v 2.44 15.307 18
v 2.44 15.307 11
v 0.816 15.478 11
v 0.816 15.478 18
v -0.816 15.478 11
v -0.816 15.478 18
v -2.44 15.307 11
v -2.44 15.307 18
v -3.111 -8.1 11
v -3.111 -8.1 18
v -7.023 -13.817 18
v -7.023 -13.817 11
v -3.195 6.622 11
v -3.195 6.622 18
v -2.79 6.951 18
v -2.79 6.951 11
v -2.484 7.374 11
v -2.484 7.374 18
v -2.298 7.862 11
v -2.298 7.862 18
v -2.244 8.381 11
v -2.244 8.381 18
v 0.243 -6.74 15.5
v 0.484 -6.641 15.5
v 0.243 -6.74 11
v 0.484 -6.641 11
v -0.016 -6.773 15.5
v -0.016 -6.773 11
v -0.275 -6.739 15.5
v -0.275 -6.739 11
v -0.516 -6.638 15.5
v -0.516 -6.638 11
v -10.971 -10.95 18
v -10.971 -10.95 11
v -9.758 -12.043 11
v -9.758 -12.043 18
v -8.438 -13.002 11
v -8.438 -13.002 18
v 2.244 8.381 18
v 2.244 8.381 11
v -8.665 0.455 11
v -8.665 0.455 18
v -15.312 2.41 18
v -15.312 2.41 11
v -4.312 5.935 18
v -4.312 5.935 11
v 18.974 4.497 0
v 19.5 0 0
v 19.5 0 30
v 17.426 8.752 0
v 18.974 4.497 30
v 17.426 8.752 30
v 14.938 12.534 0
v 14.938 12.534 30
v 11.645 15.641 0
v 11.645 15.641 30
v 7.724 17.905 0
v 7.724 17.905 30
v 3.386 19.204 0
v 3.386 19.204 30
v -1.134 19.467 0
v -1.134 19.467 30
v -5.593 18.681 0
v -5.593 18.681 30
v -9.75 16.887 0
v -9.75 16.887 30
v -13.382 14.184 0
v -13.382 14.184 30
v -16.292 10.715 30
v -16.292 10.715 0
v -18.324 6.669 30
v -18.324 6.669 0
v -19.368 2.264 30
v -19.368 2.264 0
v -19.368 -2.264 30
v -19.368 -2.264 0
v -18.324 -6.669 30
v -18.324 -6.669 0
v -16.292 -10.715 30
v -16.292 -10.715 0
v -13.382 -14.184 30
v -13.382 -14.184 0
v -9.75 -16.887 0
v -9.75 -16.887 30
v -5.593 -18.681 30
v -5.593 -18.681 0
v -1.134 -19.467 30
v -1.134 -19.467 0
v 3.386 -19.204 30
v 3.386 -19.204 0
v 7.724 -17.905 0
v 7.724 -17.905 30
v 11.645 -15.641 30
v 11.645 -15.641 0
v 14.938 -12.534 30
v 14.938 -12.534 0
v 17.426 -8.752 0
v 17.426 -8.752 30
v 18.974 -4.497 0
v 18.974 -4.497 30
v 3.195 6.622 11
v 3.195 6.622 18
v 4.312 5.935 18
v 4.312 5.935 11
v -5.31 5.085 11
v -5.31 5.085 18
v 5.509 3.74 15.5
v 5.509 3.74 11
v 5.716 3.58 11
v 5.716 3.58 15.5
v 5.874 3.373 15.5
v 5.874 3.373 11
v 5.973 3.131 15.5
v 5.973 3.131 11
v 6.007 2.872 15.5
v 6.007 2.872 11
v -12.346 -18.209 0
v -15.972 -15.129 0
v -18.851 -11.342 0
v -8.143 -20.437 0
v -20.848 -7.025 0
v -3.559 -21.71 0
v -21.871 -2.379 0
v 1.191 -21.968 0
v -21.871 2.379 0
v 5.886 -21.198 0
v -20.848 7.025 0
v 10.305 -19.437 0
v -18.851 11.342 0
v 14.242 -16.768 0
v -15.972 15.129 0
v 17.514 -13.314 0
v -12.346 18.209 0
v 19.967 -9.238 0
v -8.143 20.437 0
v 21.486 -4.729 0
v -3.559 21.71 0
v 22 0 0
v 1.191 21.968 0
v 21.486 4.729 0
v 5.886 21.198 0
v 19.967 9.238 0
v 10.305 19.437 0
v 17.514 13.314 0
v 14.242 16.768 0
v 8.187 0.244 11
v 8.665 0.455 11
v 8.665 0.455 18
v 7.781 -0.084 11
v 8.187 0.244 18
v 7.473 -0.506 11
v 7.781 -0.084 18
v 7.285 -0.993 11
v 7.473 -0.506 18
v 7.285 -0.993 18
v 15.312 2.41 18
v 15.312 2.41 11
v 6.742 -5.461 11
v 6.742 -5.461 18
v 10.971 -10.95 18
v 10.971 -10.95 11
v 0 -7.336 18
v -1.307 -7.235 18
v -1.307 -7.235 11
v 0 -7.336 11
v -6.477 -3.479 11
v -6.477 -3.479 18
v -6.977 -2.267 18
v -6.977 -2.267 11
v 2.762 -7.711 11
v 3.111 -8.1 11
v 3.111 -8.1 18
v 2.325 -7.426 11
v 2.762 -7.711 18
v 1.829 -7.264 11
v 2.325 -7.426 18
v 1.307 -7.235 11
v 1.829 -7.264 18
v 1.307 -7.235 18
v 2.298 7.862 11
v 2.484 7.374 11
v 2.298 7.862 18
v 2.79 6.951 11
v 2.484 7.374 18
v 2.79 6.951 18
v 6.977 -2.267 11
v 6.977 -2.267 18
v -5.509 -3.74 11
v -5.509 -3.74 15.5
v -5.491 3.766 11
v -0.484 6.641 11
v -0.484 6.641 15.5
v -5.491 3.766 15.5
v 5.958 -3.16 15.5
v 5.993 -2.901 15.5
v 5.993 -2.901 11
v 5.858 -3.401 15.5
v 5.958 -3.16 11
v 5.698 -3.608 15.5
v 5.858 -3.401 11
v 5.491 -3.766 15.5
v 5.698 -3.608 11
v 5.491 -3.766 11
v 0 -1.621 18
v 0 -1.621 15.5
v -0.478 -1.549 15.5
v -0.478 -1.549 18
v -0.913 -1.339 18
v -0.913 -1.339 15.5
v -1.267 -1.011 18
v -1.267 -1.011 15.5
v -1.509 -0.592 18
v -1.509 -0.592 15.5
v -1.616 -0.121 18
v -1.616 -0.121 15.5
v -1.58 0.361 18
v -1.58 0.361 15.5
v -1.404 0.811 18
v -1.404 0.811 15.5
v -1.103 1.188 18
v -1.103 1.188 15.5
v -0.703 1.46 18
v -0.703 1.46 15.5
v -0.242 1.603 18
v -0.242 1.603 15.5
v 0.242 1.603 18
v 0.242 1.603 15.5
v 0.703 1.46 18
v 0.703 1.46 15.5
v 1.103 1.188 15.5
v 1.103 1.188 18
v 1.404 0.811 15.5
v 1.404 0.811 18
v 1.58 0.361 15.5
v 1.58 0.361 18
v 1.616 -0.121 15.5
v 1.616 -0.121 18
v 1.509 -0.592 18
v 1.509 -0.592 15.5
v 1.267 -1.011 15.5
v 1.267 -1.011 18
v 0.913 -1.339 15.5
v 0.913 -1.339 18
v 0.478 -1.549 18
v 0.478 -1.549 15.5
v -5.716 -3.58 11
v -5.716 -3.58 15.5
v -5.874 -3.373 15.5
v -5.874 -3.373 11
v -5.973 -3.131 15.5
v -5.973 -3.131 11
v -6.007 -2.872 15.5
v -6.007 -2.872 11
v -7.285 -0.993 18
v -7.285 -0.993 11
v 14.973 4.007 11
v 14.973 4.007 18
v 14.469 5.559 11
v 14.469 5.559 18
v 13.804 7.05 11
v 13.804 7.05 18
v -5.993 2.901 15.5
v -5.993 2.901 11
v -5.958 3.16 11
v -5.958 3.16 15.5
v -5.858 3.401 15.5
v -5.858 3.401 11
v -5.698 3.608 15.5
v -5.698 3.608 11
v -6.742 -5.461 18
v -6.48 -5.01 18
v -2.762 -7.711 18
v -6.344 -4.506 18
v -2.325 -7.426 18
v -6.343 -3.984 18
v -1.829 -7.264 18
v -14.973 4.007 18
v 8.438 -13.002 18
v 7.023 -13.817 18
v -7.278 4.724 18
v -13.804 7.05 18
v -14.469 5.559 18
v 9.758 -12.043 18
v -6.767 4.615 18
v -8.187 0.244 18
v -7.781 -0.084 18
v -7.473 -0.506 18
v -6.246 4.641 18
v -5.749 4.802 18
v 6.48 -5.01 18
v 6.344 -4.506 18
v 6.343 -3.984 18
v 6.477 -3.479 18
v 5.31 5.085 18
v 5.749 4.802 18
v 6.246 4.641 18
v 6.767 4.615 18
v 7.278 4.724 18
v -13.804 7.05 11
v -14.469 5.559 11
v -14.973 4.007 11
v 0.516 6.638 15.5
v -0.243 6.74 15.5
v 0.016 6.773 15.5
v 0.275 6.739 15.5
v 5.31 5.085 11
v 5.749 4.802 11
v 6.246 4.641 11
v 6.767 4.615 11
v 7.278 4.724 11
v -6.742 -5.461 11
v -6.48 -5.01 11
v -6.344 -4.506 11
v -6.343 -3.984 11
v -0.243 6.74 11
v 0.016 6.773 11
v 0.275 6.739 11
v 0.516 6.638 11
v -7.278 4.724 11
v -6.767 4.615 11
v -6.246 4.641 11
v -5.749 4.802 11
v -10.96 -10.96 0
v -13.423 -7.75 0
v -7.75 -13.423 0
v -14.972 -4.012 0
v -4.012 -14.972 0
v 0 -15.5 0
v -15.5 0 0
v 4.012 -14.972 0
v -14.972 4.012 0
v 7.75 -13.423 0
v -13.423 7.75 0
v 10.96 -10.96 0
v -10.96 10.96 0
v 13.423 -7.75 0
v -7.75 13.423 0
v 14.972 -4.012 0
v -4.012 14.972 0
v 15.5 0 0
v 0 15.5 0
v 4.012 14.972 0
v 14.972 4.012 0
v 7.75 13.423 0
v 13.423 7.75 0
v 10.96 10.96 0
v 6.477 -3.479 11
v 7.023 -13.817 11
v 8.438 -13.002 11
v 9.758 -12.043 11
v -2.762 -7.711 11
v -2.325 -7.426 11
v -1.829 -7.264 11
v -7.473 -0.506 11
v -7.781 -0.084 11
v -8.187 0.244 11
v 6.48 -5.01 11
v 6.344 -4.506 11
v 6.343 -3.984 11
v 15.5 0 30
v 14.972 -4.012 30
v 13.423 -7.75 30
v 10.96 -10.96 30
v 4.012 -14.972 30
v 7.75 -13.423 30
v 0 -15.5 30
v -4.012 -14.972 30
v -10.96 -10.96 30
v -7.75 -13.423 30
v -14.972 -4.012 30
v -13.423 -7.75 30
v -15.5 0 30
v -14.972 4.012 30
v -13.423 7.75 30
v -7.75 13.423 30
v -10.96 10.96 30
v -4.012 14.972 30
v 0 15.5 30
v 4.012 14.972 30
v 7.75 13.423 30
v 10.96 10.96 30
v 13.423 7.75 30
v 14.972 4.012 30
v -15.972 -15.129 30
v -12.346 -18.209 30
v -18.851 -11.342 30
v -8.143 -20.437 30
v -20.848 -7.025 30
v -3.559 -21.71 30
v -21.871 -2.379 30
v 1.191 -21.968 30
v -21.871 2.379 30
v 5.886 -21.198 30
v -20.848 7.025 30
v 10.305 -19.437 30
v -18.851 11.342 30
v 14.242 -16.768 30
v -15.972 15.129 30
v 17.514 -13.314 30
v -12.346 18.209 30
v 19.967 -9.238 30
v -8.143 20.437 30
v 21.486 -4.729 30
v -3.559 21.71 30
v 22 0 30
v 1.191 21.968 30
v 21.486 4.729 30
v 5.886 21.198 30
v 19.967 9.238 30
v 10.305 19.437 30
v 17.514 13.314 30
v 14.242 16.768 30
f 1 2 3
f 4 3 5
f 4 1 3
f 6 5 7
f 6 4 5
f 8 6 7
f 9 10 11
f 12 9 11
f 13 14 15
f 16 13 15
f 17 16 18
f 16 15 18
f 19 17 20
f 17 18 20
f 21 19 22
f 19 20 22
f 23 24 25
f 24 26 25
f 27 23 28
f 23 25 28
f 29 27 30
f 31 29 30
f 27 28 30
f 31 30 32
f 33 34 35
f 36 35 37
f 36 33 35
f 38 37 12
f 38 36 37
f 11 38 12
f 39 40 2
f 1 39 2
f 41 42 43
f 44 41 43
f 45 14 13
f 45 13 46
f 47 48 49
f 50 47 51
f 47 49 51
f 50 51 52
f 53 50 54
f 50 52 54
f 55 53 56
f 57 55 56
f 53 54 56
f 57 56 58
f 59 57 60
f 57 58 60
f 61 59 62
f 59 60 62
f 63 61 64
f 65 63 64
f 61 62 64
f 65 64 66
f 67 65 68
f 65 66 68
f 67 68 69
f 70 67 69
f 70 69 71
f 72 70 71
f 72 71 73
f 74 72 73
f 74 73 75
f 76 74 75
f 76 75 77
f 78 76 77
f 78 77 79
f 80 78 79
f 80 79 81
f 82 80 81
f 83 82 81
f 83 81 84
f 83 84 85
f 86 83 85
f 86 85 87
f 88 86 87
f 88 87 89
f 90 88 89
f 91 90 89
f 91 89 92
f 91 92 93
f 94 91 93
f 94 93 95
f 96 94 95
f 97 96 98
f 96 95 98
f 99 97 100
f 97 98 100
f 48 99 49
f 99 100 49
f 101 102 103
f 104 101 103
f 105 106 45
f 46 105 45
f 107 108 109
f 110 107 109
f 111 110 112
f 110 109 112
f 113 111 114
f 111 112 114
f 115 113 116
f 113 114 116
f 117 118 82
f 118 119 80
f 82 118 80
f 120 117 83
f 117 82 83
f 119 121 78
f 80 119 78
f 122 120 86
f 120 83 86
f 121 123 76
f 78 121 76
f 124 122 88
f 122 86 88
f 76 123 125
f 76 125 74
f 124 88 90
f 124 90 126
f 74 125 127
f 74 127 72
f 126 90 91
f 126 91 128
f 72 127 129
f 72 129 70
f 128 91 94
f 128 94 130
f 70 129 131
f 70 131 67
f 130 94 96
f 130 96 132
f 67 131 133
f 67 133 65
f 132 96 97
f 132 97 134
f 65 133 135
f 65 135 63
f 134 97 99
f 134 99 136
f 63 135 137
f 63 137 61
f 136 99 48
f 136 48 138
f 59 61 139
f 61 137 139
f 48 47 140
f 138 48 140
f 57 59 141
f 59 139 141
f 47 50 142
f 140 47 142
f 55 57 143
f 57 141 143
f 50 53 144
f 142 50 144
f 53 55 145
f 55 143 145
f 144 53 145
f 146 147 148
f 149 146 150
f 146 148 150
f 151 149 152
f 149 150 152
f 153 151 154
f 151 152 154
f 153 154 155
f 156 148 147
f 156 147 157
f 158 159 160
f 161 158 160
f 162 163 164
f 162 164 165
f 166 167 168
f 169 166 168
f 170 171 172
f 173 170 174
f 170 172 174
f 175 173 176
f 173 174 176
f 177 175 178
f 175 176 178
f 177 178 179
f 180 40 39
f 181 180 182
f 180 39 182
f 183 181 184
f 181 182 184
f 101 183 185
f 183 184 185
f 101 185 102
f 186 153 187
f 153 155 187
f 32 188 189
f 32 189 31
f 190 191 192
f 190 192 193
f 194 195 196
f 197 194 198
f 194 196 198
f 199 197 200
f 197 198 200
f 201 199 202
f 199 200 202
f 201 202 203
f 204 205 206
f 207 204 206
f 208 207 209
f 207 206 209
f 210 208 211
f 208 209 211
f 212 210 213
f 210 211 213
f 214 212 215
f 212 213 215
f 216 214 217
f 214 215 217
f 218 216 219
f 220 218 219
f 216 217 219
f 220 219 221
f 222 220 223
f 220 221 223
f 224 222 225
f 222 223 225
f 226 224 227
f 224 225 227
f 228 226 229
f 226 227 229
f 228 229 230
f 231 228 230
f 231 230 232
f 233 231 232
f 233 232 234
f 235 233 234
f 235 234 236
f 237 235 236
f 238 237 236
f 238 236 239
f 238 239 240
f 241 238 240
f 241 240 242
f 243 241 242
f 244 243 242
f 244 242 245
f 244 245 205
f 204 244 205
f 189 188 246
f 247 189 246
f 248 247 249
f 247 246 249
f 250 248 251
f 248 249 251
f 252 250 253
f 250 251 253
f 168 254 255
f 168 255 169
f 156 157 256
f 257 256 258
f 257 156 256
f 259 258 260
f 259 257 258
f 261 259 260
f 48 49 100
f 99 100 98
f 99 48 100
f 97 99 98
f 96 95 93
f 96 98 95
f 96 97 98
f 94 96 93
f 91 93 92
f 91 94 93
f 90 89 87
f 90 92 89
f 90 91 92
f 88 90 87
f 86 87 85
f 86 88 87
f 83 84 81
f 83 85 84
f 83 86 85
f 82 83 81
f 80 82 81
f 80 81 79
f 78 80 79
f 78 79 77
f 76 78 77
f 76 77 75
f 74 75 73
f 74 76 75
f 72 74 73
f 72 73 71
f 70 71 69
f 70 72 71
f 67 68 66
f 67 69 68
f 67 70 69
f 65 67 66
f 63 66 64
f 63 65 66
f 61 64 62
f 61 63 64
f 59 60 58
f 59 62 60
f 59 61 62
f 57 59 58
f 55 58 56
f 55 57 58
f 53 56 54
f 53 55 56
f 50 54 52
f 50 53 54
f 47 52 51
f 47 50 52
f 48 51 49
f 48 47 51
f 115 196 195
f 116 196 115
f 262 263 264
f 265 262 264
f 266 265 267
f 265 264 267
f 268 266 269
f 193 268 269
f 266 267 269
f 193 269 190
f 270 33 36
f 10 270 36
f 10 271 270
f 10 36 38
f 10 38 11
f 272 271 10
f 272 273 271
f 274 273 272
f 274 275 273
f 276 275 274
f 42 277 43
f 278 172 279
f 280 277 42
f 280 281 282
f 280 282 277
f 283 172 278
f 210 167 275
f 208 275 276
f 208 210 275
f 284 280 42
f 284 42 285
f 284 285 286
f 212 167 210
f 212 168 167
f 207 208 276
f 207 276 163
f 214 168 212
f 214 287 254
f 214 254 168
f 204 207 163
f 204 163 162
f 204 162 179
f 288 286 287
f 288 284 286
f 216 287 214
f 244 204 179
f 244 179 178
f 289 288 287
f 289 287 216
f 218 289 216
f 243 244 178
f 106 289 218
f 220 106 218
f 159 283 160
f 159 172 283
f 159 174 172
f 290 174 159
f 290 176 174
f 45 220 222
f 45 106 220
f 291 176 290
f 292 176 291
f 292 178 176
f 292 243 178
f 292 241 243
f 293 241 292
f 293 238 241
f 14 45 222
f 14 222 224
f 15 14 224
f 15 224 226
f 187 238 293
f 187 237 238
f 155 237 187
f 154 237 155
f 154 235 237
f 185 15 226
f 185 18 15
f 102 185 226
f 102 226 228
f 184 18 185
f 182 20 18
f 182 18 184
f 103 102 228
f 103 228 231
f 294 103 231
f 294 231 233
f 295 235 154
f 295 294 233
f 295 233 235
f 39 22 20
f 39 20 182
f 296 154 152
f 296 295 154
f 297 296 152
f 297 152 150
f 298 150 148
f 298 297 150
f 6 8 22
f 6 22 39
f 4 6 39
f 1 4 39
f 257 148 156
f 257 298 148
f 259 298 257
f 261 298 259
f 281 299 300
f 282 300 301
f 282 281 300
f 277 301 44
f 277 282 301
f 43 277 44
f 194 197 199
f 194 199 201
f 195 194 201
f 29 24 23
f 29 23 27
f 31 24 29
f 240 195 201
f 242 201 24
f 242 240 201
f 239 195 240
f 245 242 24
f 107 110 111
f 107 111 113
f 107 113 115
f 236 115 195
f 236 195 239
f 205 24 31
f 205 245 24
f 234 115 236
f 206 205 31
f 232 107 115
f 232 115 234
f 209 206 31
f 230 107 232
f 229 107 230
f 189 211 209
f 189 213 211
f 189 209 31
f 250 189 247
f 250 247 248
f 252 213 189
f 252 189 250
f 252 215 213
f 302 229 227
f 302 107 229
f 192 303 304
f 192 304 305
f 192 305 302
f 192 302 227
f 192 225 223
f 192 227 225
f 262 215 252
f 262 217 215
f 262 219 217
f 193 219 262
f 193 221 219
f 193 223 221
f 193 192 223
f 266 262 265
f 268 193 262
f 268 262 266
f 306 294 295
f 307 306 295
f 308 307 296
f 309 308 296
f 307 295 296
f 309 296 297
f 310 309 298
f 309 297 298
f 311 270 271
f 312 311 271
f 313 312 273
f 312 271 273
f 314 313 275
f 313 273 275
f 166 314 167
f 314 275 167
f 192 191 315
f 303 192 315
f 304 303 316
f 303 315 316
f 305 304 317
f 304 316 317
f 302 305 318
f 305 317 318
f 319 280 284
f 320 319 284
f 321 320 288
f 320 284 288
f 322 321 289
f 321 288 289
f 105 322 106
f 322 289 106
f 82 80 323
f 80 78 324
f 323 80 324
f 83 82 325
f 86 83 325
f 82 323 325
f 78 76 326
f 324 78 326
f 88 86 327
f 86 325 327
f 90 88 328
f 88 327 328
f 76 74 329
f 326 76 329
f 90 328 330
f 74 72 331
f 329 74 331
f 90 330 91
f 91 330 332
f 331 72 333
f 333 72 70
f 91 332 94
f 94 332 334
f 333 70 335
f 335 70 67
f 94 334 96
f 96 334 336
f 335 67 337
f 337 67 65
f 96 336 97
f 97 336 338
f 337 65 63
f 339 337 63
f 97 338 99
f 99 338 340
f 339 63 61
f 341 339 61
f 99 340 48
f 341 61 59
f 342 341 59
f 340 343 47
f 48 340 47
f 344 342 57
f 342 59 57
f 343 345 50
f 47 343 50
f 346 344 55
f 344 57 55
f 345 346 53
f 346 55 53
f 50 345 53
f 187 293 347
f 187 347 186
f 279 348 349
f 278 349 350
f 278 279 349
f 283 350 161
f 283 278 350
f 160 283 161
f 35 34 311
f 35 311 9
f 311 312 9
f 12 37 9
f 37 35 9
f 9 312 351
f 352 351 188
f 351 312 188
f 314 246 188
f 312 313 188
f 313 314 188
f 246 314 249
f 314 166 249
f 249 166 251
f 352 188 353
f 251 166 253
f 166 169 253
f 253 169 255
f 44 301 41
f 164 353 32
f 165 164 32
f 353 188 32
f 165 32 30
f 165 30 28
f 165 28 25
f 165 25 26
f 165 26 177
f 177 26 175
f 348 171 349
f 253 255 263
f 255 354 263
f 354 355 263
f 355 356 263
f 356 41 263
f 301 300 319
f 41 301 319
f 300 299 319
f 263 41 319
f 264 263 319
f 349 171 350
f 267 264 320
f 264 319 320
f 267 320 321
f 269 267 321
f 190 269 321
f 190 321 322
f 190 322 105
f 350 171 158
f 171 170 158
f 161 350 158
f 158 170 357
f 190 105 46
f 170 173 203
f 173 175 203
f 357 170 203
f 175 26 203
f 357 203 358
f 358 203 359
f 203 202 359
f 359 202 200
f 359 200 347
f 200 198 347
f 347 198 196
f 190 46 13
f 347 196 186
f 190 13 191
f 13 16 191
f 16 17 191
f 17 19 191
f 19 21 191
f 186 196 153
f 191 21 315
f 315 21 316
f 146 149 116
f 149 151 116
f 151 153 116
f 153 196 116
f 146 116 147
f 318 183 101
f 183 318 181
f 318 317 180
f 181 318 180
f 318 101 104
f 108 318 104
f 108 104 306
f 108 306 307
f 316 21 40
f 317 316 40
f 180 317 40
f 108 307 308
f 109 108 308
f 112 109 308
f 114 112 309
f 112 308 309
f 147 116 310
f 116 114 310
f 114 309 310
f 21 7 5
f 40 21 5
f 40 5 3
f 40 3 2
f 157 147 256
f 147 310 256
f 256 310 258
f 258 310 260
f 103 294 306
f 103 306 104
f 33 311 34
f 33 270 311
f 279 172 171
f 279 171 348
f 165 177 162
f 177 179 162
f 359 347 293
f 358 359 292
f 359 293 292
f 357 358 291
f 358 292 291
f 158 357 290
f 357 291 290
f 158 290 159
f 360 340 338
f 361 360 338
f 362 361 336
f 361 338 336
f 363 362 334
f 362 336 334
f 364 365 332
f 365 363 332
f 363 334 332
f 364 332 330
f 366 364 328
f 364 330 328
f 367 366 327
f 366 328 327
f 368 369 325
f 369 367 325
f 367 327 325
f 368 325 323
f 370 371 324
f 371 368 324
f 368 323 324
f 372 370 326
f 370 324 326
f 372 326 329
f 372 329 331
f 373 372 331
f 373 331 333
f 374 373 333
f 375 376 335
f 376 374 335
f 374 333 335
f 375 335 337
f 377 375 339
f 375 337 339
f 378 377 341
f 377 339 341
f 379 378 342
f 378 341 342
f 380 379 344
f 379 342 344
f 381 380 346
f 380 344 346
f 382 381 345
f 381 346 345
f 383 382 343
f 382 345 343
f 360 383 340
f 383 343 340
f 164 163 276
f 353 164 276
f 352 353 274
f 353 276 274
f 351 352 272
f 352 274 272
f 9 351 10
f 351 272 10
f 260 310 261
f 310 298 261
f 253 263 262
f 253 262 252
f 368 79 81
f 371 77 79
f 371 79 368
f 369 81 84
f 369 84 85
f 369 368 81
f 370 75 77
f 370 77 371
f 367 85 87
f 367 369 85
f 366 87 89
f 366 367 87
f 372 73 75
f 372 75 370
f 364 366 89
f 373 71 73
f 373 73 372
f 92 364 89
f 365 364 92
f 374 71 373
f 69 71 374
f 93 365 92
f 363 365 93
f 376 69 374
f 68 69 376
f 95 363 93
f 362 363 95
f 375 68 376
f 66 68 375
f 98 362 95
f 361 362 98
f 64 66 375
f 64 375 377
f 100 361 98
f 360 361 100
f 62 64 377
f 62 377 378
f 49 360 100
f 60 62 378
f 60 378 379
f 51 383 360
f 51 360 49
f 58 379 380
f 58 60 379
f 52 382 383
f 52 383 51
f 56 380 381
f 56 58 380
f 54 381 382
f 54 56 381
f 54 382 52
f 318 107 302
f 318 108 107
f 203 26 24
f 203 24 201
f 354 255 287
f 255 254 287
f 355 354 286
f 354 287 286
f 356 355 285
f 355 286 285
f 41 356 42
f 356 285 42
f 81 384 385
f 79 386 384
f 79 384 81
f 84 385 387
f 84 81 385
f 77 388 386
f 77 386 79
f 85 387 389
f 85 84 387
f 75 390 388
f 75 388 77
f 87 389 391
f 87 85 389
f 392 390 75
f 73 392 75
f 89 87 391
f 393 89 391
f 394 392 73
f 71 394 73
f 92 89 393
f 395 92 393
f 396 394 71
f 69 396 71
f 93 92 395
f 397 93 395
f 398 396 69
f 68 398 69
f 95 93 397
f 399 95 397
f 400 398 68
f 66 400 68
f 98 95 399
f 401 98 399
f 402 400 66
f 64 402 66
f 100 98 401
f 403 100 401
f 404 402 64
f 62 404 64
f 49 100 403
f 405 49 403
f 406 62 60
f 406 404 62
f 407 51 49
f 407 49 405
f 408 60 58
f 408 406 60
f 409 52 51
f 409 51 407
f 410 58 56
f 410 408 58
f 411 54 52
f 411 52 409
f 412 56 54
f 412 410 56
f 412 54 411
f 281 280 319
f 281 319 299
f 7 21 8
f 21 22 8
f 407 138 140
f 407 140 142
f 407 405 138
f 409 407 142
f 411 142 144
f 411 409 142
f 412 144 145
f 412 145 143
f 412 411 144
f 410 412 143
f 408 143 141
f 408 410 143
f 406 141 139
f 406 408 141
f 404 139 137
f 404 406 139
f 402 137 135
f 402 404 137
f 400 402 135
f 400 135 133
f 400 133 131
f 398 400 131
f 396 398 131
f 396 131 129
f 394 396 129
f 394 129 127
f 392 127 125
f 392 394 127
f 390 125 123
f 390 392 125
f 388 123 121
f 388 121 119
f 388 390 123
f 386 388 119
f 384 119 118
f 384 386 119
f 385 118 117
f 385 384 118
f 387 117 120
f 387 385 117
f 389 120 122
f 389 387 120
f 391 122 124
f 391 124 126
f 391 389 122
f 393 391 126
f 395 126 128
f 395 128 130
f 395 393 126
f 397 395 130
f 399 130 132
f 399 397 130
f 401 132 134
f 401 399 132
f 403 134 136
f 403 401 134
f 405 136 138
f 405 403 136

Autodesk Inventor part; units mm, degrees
ref_plane "YZ Plane" through (0, 0, 0) normal (1, 0, 0) x (0, 1, 0)
ref_plane "XZ Plane" through (0, 0, 0) normal (0, 1, 0) x (-1, 0, 0)
sketch "Sketch1" plane through (0, 0, 0) normal (0, 0, 1) x (1, 0, 0)
  circle A0 centre (0, 0) radius 19.5
  circle A1 centre (0, 0) radius 15.5
  dimension "d0" = 39
  dimension "d3" = 31
extrude "Extrusion1" add sketch "Sketch1" along normal blind 30
sketch "Sketch2" plane through (0, 0, 30) normal (0, 0, 1) x (1, 0, 0)
  circle A0 centre (0, 0) radius 22
  circle A1 centre (0, 0) radius 19.5
  dimension "d4" = 44
  dimension "d5" = 39
extrude "Extrusion2" add sketch "Sketch2" against normal blind 30 separate body
ref_plane "Work Plane1" through (0, 0, 18) normal (0, 0, 1) x (1, 0, 0)
sketch "Sketch3" plane through (0, 0, 18) normal (0, 0, 1) x (1, 0, 0)
  line L0 (2.2444, 8.3814) -> (2.4396, 15.3068)
  circle A0 centre (0, 0) radius 15.5 projected
  line L1 (3.1952, 6.6218) -> (7.2273, 4.1399)
  arc A1 (2.2444, 8.3814) -> (3.1952, 6.6218) centre (4.2436, 8.325) ccw
  line L2 (0, 0) -> (0, 15.5)
  line L3 (-2.2444, 8.3814) -> (-2.4396, 15.3068)
  line L4 (-3.1952, 6.6218) -> (-7.2273, 4.1399)
  arc A2 (-3.1952, 6.6218) -> (-2.2444, 8.3814) centre (-4.2436, 8.325) ccw
  line L5 (-7.2776, 4.7245) -> (-13.8037, 7.0503)
  line L6 (-5.3103, 5.0851) -> (-1.7039, 8.1528)
  arc A3 (-7.2776, 4.7245) -> (-5.3103, 5.0851) centre (-6.6062, 6.6085) ccw
  line L7 (0, 0) -> (-14.7414, 4.7898)
  line L8 (-8.6647, 0.4554) -> (-15.3115, 2.4098)
  line L9 (-7.2851, -0.9926) -> (-6.1706, -5.5943)
  arc A4 (-7.2851, -0.9926) -> (-8.6647, 0.4554) centre (-9.2289, -1.4634) ccw
  line L10 (-6.7422, -5.4614) -> (-10.9708, -10.9495)
  line L11 (-6.4772, -3.4791) -> (-8.2803, 0.8989)
  arc A5 (-6.7422, -5.4614) -> (-6.4772, -3.4791) centre (-8.3265, -4.2407) ccw
  line L12 (0, 0) -> (-9.1107, -12.5398)
  line L13 (-3.1107, -8.0999) -> (-7.0234, -13.8174)
  line L14 (-1.3072, -7.2353) -> (3.4136, -7.5973)
  arc A6 (-1.3072, -7.2353) -> (-3.1107, -8.0999) centre (-1.4602, -9.2294) ccw
  line L15 (3.1107, -8.0999) -> (7.0234, -13.8174)
  line L16 (1.3072, -7.2353) -> (-3.4136, -7.5973)
  arc A7 (3.1107, -8.0999) -> (1.3072, -7.2353) centre (1.4602, -9.2294) ccw
  line L17 (0, 0) -> (9.1107, -12.5398)
  line L18 (6.7422, -5.4614) -> (10.9708, -10.9495)
  line L19 (6.4772, -3.4791) -> (8.2803, 0.8989)
  arc A8 (6.4772, -3.4791) -> (6.7422, -5.4614) centre (8.3265, -4.2407) ccw
  line L20 (8.6647, 0.4554) -> (15.3115, 2.4098)
  line L21 (7.2851, -0.9926) -> (6.1706, -5.5943)
  arc A9 (8.6647, 0.4554) -> (7.2851, -0.9926) centre (9.2289, -1.4634) ccw
  line L22 (0, 0) -> (14.7414, 4.7898)
  line L23 (7.2776, 4.7245) -> (13.8037, 7.0503)
  line L24 (5.3103, 5.0851) -> (1.7039, 8.1528)
  arc A10 (5.3103, 5.0851) -> (7.2776, 4.7245) centre (6.6062, 6.6085) ccw
  point P0 (2.0082, 0)
  point P1 (0.6206, 1.9099)
  point P2 (-1.6246, 1.1804)
  point P3 (-1.6246, -1.1804)
  point P4 (0.6206, -1.9099)
  point P5 (-6.9765, -2.2668)
  point P6 (0, -7.3355)
  point P7 (6.9765, -2.2668)
  point P8 (4.3117, 5.9345)
  point P9 (-4.3117, 5.9345)
  dimension "d13" = 60
  dimension "d15" = 15.3068
  dimension "d17" = 2
  dimension "d20" = 360
extrude "Extrusion3" add sketch "Sketch3" against normal blind 7 separate body contours A1 L1 L24 A10 L23 A0 L22 L2 L0 | L2 L7 A0 L5 A3 L6 L4 A2 L3 | A0 L20 A9 L21 L19 A8 L18 L17 L22 | L12 A0 L10 A5 L11 L9 A4 L8 L7 | L17 A0 L15 A7 L16 L14 A6 L13 L12
sketch "Sketch4" plane through (0, 0, 11) normal (0, 0, -1) x (-1, 0, 0)
  line L0 (5.993, 2.9012) -> (6.0069, -2.8723)
  line L1 (5.509, -3.7395) -> (0.516, -6.6383)
  line L2 (-0.484, -6.6407) -> (-5.491, -3.766)
  line L3 (-5.993, -2.9012) -> (-6.0069, 2.8723)
  line L4 (-5.509, 3.7395) -> (-0.516, 6.6383)
  line L5 (0.484, 6.6407) -> (5.491, 3.766)
  arc A0 (0.484, 6.6407) -> (-0.516, 6.6383) centre (-0.0139, 5.7735) ccw
  arc A1 (5.993, 2.9012) -> (5.491, 3.766) centre (4.993, 2.8988) ccw
  arc A2 (-5.509, 3.7395) -> (-6.0069, 2.8723) centre (-5.0069, 2.8747) ccw
  arc A3 (-5.993, -2.9012) -> (-5.491, -3.766) centre (-4.993, -2.8988) ccw
  arc A4 (5.509, -3.7395) -> (6.0069, -2.8723) centre (5.0069, -2.8747) ccw
  arc A5 (-0.484, -6.6407) -> (0.516, -6.6383) centre (0.0139, -5.7735) ccw
  point P0 (0, 0)
  point P1 (5.9916, 3.4785)
  point P2 (6.0083, -3.4496)
  point P3 (0.0167, -6.9282)
  point P4 (-5.9916, -3.4785)
  point P5 (-6.0083, 3.4496)
  point P6 (-0.0167, 6.9282)
  dimension "d25" = 12
  dimension "d27" = 1
  dimension "d28" = 1
extrude "Extrusion4" cut sketch "Sketch4" against normal blind 4.5 bodies 3
sketch "Sketch5" plane through (0, 0, 18) normal (0, 0, 1) x (1, 0, 0)
  point P0 (0, 0)
  point P1 (0, 0)
hole "Hole1" at (0, 0, 18) direction (0, 0, -1) diameter 3.242 depth 11.8 tip angle 118 bodies 3 thread size "M4x0.7" class "6H" standard "ISO Metric profile"
properties part number "BANH_44"
